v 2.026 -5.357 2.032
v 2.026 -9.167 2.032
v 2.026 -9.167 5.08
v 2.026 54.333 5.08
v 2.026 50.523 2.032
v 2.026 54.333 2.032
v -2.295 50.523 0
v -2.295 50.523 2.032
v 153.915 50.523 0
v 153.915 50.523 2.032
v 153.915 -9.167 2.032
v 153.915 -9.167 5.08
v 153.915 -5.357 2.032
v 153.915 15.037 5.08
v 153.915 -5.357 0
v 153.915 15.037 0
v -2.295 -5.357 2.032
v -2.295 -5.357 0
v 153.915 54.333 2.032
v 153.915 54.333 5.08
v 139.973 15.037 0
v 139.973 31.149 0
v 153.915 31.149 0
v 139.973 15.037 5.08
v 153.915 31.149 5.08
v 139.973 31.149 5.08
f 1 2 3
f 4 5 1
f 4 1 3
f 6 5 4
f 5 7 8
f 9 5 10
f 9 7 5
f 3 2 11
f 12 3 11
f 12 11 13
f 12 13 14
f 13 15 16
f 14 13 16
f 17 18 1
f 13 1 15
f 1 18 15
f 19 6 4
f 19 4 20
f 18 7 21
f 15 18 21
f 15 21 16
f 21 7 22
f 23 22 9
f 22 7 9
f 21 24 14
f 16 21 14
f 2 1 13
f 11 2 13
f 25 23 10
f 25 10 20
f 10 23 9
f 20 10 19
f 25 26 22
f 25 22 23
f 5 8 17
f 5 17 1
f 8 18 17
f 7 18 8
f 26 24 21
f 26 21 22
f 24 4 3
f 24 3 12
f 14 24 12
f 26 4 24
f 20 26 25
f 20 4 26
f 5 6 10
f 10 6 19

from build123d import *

# Parameters (mm, degrees)
SKETCH3_W           = 156.21
SKETCH3_H           = 55.88
BOSS_EXTRUDE2_DEPTH = 2.032
SKETCH4_W           = 151.888767811
SKETCH4_H           = 63.5
BOSS_EXTRUDE3_DEPTH = 3.048
SKETCH5_W           = 13.94179759
SKETCH5_H           = 16.111517863
CUT_EXTRUDE1_DEPTH  = 6.08


with BuildPart() as part:
    # Sketch3 → Boss-Extrude2 (new body)
    with BuildSketch(Plane.XY):
        with Locations((75.809845761, 22.583067422)):
            Rectangle(SKETCH3_W, SKETCH3_H)
    extrude(amount=BOSS_EXTRUDE2_DEPTH)

    # Sketch4 → Boss-Extrude3 (add)
    with BuildSketch(Plane.XY.offset(2.032)):
        with Locations((77.970461856, 22.583067422)):
            Rectangle(SKETCH4_W, SKETCH4_H)
    extrude(amount=BOSS_EXTRUDE3_DEPTH)

    # Sketch5 → Cut-Extrude1 (cut, through all)
    with BuildSketch(Plane.XY.offset(5.08)):
        with Locations((146.943946966, 23.09296993)):
            Rectangle(SKETCH5_W, SKETCH5_H)
    extrude(amount=-CUT_EXTRUDE1_DEPTH, mode=Mode.SUBTRACT)


solid = part.part
